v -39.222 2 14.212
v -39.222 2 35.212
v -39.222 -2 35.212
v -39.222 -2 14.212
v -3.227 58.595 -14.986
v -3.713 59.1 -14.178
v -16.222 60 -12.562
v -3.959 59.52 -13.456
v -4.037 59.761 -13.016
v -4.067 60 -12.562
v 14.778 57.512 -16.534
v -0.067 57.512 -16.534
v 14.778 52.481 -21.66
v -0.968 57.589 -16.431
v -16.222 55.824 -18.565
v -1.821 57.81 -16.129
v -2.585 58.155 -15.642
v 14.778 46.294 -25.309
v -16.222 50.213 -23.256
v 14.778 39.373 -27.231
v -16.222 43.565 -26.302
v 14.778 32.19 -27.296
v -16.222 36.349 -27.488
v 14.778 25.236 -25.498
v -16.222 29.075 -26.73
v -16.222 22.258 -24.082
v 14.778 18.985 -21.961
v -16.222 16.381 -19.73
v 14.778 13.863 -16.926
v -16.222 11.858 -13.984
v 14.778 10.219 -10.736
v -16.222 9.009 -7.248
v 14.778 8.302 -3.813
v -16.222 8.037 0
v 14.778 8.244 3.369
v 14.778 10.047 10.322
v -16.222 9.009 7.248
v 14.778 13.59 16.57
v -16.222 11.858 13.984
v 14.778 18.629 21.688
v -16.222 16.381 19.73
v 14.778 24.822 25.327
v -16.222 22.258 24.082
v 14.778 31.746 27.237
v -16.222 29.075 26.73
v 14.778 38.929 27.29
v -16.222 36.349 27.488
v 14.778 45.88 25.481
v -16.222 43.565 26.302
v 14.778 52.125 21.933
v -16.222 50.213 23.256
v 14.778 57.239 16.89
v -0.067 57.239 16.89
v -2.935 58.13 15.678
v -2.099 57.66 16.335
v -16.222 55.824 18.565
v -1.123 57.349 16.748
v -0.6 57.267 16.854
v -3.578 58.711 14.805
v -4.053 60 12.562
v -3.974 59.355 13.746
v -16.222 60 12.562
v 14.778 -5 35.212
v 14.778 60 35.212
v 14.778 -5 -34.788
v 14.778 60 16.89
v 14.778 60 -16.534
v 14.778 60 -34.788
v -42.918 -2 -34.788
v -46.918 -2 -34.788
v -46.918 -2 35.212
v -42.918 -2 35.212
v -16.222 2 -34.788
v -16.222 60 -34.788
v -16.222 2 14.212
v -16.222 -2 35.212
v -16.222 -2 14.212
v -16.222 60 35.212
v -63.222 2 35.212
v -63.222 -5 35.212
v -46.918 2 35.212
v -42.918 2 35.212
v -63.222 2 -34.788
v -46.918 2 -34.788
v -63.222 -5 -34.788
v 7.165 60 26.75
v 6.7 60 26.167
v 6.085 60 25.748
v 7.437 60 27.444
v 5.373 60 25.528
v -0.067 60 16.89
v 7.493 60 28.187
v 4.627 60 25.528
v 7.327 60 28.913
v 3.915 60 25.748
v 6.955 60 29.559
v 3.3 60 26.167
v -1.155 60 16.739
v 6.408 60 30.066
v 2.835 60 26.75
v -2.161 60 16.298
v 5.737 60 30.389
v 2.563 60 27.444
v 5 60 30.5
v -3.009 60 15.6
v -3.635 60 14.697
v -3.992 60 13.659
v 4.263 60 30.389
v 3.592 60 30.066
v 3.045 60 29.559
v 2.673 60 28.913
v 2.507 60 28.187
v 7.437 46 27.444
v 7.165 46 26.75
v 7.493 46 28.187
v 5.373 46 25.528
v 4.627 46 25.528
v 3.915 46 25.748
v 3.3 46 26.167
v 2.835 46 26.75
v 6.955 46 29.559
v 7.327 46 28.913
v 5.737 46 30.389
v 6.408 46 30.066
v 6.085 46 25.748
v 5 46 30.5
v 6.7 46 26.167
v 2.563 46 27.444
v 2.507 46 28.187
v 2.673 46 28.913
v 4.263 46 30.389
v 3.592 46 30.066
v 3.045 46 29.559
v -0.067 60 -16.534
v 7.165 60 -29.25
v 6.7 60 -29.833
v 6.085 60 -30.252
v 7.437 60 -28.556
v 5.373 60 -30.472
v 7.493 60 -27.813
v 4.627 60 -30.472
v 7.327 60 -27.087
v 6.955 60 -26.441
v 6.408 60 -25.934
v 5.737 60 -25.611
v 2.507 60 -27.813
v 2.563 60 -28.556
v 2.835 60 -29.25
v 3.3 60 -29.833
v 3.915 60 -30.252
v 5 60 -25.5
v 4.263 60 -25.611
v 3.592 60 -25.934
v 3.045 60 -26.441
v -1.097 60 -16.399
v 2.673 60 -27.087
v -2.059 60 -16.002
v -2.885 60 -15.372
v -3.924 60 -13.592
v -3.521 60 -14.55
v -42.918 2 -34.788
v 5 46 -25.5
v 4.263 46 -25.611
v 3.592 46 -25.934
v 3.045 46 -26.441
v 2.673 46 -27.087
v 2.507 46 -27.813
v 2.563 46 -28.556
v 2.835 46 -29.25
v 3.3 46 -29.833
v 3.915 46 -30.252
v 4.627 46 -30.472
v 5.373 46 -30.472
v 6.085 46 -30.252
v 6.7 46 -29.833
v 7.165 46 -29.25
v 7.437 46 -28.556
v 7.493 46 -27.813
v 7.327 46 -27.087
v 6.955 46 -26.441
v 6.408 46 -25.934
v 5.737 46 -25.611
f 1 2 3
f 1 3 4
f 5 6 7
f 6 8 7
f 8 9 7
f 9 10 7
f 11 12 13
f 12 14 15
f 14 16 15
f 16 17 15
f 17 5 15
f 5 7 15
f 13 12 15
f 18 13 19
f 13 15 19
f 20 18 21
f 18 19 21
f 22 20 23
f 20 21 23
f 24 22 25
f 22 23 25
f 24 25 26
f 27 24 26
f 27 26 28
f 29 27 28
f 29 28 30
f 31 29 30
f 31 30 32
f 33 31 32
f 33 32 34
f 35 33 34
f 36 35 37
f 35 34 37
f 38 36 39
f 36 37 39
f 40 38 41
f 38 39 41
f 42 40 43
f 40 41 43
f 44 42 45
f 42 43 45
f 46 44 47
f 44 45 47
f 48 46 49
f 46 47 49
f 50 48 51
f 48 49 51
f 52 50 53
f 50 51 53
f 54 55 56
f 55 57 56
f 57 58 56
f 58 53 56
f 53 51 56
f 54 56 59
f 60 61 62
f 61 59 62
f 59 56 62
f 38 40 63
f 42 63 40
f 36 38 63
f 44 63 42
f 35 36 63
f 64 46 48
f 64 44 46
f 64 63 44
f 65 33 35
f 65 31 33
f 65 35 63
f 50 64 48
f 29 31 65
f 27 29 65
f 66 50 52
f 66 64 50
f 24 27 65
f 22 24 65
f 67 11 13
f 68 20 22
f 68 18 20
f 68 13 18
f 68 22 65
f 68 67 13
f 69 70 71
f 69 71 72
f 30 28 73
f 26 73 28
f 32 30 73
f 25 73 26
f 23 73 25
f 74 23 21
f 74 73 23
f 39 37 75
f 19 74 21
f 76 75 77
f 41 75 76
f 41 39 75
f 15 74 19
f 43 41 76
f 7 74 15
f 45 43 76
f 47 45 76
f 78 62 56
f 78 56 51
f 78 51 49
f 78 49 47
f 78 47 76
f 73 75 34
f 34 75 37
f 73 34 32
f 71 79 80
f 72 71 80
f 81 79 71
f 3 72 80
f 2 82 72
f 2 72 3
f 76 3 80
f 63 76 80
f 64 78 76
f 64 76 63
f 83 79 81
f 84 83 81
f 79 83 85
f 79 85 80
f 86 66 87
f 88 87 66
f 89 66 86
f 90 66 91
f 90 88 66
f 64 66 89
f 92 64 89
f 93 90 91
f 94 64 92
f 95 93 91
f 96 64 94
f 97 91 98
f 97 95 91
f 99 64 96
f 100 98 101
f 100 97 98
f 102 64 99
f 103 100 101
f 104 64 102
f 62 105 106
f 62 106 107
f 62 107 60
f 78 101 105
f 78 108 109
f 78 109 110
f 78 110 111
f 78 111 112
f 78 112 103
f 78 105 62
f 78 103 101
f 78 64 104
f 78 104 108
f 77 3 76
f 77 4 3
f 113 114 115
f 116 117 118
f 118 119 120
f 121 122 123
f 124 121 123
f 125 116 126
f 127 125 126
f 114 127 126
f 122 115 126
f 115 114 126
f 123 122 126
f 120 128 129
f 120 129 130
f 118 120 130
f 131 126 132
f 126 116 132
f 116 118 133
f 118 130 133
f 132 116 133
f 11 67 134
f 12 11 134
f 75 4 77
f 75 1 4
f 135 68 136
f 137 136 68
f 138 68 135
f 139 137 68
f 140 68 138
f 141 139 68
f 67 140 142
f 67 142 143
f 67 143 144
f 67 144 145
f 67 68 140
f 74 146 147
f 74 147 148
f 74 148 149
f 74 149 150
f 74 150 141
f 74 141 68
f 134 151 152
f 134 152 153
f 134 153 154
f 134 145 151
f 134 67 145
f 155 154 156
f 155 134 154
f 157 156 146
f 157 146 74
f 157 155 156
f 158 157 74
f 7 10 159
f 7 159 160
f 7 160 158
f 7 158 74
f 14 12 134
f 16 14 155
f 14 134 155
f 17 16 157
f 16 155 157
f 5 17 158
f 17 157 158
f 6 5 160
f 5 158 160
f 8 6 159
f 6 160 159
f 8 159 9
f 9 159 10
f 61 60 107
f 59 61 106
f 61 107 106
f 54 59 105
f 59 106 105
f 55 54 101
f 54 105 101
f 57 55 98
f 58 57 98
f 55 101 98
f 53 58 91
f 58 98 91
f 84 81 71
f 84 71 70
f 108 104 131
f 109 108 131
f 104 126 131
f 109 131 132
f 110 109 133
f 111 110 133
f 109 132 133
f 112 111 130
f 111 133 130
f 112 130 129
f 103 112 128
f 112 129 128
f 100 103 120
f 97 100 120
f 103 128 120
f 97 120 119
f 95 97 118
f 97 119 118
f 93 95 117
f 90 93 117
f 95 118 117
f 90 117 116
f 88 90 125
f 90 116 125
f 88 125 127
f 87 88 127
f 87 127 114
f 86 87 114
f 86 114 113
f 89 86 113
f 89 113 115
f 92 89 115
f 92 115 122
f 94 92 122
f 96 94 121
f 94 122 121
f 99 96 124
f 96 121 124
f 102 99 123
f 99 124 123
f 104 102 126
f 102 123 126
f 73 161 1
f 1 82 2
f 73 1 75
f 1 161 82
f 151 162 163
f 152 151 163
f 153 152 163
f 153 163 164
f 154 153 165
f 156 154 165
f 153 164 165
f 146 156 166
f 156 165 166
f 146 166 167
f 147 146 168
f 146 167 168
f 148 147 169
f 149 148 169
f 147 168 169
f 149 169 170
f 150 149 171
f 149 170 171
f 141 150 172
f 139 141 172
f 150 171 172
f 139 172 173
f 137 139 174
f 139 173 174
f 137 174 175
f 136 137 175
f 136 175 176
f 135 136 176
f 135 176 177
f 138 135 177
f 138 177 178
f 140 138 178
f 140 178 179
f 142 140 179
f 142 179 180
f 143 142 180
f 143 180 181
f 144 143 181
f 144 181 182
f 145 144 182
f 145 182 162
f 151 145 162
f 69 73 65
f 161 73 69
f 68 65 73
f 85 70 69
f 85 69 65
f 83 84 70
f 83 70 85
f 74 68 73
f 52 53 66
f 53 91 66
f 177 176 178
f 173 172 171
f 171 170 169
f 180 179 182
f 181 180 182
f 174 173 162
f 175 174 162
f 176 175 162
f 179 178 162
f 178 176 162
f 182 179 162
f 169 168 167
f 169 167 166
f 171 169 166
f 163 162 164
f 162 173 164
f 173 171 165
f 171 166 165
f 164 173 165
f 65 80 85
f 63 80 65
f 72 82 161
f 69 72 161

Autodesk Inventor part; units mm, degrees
ref_plane "YZ Plane" through (0, 0, 0) normal (1, 0, 0) x (0, 1, 0)
ref_plane "XZ Plane" through (0, 0, 0) normal (0, 1, 0) x (-1, 0, 0)
ref_plane "XY Plane" through (0, 0, 0) normal (0, 0, 1) x (1, 0, 0)
sketch "Sketch1" plane through (0, 0, 0) normal (0, 1, 0) x (-1, 0, 0)
  line L0 (16.2222, 35.2121) -> (-14.7778, 35.2121)
  line L1 (-14.7778, 35.2121) -> (-14.7778, -34.7879)
  line L2 (-14.7778, -34.7879) -> (16.2222, -34.7879)
  line L3 (16.2222, -34.7879) -> (16.2222, 35.2121)
  point P0 (0, 0)
  dimension "d0" = 70
  dimension "d1" = 31
extrude "Extrusion1" add sketch "Sketch1" along normal blind 60
sketch "Sketch3" plane through (14.7778, 0, 35.2121) normal (1, 0, 0) x (0, 0, -1)
  circle A0 centre (35.2121, 35.5368) radius 27.5
  point P0 (35.2121, 0)
  dimension "d5" = 55
hole "Hole1" at (14.7778, 35.5368, 0) direction (-1, 0, 0) diameter 55 end through all
sketch "Sketch6" plane through (0, 60, 0) normal (0, 1, 0) x (1, 0, 0)
  line L0 (-0.0667, -13.4045) -> (-0.0667, 12.7365)
  line L1 (-16.2222, 0) -> (14.7778, 0) construction
  circle A0 centre (-0.0667, -12.8895) radius 4
  circle A1 centre (-0.0667, 12.5336) radius 4
  point P0 (0, 0)
  point P1 (14.7778, -12.562)
  point P2 (-16.2222, -12.562)
  point P3 (-16.2222, 12.562)
  point P4 (14.7778, 12.562)
  dimension "d42" = 8
  dimension "d43" = 8
sketch "Sketch8" plane through (0, 60, 0) normal (0, 1, 0) x (1, 0, 0)
  line L0 (14.7778, 34.7879) -> (-16.2222, 34.7879) construction
  line L1 (-16.2222, 0) -> (14.7778, 0) construction
  circle A0 centre (5, -28) radius 2
  circle A1 centre (5, 28) radius 2
  point P0 (0, 0)
  dimension "d33" = 4
extrude "Extrusion4" cut sketch "Sketch6" against normal blind 4
sketch "Sketch15" plane through (0, 60, 0) normal (0, 1, 0) x (1, 0, 0)
  arc A0 (-4.0532, -12.562) -> (3.9199, -12.562) centre (-0.0667, -12.8895) ccw projected
  line L0 (-0.0667, -16.8895) -> (14.7778, -16.8895)
  line L1 (14.7778, 27.5) -> (14.7778, -27.5) projected
  line L2 (14.7778, -12.562) -> (14.7778, -16.8895)
  line L3 (14.7778, -12.562) -> (3.9199, -12.562) projected
  line L4 (-0.0667, -12.8895) -> (-0.0667, -12.8895)
  arc A1 (3.9332, 12.562) -> (-4.0666, 12.562) centre (-0.0667, 12.5336) ccw projected
  line L5 (-0.0667, 16.5336) -> (-0.0667, 12.5336)
  line L6 (3.9332, 12.562) -> (14.7778, 12.562) projected
  line L7 (14.7778, 12.562) -> (14.7778, 16.5336)
  line L8 (14.7778, 16.5336) -> (-0.0667, 16.5336)
  line L9 (-0.0667, -12.562) -> (14.7778, -12.562)
  line L10 (-0.0667, -12.562) -> (-0.0667, -16.8895)
  line L11 (14.7778, 12.562) -> (-0.0667, 12.5336)
  point P0 (0, 0)
extrude "Extrusion5" cut sketch "Sketch15" against normal blind 4 contours A0 L3 L1 L0 | L1 L6 A1 L8
hole "Hole5" at (5, 60, 28) at (5, 60, -28) direction (0, -1, 0) diameter 5 depth 14
sketch "Sketch18" plane through (0, 0, 0) normal (0, -1, 0) x (1, 0, 0)
  line L0 (-16.2222, -34.7879) -> (-63.2222, -34.7879)
  line L1 (-16.2222, 35.2121) -> (-63.2222, 35.2121)
  line L2 (-63.2222, 35.2121) -> (-63.2222, -34.7879)
  line L3 (-16.2222, -34.7879) -> (-16.2222, 35.2121)
  line L4 (-63.2222, -34.7879) -> (-63.2222, 35.2121)
  point P0 (0, 0)
  dimension "d57" = 47
extrude "Extrusion9" add sketch "Sketch18" against normal blind 2
sketch "Sketch25" plane through (0, 0, 0) normal (0, -1, 0) x (1, 0, 0)
  line L0 (-63.2222, 35.2121) -> (14.7778, 35.2121)
  line L1 (14.7778, 35.2121) -> (14.7778, -34.7879)
  line L2 (14.7778, -34.7879) -> (-63.2222, -34.7879)
  line L3 (-63.2222, -34.7879) -> (-63.2222, 35.2121)
  point P0 (0, 0)
extrude "Extrusion11" add sketch "Sketch25" along normal blind 5
sketch "Sketch29" plane through (0, 2, 0) normal (0, 1, 0) x (1, 0, 0)
  point P0 (0, 0)
sketch "Sketch35" plane through (-63.2222, -5, 35.2121) normal (0, 0, 1) x (1, 0, 0)
  line L0 (42.5, 127.0601) -> (62.5, 127.0601)
  line L1 (62.5, 127.0601) -> (62.5, 71.1035)
  line L2 (62.5, 119.9853) -> (62.5, 78.9853) projected
  line L3 (62.5, 71.1035) -> (42.5, 71.1035)
  line L4 (42.5, 71.1035) -> (42.5, 127.0601)
  line L5 (42.5, 78.9853) -> (42.5, 119.9853) projected
  point P0 (63.2222, 5)
extrude "Extrusion20" cut sketch "Sketch35" against normal blind 21
sketch "Sketch37" plane through (0, 2, 0) normal (0, 1, 0) x (1, 0, 0)
  line L0 (-63.2222, -35.2121) -> (-16.2222, -35.2121) projected
  line L1 (-42.9178, -35.2121) -> (-46.9178, -35.2121)
  line L2 (-46.9178, -35.2121) -> (-46.9178, 34.7879)
  line L3 (-63.2222, 34.7879) -> (14.7778, 34.7879) projected
  line L4 (-46.9178, 34.7879) -> (-42.9178, 34.7879)
  line L5 (-42.9178, -35.2121) -> (-42.9178, 34.7879)
  point P0 (0, 0)
  dimension "d140" = 4
sketch "Sketch39" plane through (0, 2, 0) normal (0, 1, 0) x (1, 0, 0)
  line L0 (-16.2222, -35.2121) -> (-39.2222, -35.2121)
  line L1 (-39.2222, -35.2121) -> (-39.2222, -14.2121)
  line L2 (-39.2222, -14.2121) -> (-16.2222, -14.2121)
  line L3 (-16.2222, -14.2121) -> (-16.2222, -35.2121)
  point P0 (0, 0)
  dimension "d120" = 23
  dimension "d121" = 21
extrude "Extrusion25" cut sketch "Sketch39" against normal blind 4
extrude "Extrusion26" cut sketch "Sketch37" against normal blind 4
properties part number "Noke_holder_latch"
